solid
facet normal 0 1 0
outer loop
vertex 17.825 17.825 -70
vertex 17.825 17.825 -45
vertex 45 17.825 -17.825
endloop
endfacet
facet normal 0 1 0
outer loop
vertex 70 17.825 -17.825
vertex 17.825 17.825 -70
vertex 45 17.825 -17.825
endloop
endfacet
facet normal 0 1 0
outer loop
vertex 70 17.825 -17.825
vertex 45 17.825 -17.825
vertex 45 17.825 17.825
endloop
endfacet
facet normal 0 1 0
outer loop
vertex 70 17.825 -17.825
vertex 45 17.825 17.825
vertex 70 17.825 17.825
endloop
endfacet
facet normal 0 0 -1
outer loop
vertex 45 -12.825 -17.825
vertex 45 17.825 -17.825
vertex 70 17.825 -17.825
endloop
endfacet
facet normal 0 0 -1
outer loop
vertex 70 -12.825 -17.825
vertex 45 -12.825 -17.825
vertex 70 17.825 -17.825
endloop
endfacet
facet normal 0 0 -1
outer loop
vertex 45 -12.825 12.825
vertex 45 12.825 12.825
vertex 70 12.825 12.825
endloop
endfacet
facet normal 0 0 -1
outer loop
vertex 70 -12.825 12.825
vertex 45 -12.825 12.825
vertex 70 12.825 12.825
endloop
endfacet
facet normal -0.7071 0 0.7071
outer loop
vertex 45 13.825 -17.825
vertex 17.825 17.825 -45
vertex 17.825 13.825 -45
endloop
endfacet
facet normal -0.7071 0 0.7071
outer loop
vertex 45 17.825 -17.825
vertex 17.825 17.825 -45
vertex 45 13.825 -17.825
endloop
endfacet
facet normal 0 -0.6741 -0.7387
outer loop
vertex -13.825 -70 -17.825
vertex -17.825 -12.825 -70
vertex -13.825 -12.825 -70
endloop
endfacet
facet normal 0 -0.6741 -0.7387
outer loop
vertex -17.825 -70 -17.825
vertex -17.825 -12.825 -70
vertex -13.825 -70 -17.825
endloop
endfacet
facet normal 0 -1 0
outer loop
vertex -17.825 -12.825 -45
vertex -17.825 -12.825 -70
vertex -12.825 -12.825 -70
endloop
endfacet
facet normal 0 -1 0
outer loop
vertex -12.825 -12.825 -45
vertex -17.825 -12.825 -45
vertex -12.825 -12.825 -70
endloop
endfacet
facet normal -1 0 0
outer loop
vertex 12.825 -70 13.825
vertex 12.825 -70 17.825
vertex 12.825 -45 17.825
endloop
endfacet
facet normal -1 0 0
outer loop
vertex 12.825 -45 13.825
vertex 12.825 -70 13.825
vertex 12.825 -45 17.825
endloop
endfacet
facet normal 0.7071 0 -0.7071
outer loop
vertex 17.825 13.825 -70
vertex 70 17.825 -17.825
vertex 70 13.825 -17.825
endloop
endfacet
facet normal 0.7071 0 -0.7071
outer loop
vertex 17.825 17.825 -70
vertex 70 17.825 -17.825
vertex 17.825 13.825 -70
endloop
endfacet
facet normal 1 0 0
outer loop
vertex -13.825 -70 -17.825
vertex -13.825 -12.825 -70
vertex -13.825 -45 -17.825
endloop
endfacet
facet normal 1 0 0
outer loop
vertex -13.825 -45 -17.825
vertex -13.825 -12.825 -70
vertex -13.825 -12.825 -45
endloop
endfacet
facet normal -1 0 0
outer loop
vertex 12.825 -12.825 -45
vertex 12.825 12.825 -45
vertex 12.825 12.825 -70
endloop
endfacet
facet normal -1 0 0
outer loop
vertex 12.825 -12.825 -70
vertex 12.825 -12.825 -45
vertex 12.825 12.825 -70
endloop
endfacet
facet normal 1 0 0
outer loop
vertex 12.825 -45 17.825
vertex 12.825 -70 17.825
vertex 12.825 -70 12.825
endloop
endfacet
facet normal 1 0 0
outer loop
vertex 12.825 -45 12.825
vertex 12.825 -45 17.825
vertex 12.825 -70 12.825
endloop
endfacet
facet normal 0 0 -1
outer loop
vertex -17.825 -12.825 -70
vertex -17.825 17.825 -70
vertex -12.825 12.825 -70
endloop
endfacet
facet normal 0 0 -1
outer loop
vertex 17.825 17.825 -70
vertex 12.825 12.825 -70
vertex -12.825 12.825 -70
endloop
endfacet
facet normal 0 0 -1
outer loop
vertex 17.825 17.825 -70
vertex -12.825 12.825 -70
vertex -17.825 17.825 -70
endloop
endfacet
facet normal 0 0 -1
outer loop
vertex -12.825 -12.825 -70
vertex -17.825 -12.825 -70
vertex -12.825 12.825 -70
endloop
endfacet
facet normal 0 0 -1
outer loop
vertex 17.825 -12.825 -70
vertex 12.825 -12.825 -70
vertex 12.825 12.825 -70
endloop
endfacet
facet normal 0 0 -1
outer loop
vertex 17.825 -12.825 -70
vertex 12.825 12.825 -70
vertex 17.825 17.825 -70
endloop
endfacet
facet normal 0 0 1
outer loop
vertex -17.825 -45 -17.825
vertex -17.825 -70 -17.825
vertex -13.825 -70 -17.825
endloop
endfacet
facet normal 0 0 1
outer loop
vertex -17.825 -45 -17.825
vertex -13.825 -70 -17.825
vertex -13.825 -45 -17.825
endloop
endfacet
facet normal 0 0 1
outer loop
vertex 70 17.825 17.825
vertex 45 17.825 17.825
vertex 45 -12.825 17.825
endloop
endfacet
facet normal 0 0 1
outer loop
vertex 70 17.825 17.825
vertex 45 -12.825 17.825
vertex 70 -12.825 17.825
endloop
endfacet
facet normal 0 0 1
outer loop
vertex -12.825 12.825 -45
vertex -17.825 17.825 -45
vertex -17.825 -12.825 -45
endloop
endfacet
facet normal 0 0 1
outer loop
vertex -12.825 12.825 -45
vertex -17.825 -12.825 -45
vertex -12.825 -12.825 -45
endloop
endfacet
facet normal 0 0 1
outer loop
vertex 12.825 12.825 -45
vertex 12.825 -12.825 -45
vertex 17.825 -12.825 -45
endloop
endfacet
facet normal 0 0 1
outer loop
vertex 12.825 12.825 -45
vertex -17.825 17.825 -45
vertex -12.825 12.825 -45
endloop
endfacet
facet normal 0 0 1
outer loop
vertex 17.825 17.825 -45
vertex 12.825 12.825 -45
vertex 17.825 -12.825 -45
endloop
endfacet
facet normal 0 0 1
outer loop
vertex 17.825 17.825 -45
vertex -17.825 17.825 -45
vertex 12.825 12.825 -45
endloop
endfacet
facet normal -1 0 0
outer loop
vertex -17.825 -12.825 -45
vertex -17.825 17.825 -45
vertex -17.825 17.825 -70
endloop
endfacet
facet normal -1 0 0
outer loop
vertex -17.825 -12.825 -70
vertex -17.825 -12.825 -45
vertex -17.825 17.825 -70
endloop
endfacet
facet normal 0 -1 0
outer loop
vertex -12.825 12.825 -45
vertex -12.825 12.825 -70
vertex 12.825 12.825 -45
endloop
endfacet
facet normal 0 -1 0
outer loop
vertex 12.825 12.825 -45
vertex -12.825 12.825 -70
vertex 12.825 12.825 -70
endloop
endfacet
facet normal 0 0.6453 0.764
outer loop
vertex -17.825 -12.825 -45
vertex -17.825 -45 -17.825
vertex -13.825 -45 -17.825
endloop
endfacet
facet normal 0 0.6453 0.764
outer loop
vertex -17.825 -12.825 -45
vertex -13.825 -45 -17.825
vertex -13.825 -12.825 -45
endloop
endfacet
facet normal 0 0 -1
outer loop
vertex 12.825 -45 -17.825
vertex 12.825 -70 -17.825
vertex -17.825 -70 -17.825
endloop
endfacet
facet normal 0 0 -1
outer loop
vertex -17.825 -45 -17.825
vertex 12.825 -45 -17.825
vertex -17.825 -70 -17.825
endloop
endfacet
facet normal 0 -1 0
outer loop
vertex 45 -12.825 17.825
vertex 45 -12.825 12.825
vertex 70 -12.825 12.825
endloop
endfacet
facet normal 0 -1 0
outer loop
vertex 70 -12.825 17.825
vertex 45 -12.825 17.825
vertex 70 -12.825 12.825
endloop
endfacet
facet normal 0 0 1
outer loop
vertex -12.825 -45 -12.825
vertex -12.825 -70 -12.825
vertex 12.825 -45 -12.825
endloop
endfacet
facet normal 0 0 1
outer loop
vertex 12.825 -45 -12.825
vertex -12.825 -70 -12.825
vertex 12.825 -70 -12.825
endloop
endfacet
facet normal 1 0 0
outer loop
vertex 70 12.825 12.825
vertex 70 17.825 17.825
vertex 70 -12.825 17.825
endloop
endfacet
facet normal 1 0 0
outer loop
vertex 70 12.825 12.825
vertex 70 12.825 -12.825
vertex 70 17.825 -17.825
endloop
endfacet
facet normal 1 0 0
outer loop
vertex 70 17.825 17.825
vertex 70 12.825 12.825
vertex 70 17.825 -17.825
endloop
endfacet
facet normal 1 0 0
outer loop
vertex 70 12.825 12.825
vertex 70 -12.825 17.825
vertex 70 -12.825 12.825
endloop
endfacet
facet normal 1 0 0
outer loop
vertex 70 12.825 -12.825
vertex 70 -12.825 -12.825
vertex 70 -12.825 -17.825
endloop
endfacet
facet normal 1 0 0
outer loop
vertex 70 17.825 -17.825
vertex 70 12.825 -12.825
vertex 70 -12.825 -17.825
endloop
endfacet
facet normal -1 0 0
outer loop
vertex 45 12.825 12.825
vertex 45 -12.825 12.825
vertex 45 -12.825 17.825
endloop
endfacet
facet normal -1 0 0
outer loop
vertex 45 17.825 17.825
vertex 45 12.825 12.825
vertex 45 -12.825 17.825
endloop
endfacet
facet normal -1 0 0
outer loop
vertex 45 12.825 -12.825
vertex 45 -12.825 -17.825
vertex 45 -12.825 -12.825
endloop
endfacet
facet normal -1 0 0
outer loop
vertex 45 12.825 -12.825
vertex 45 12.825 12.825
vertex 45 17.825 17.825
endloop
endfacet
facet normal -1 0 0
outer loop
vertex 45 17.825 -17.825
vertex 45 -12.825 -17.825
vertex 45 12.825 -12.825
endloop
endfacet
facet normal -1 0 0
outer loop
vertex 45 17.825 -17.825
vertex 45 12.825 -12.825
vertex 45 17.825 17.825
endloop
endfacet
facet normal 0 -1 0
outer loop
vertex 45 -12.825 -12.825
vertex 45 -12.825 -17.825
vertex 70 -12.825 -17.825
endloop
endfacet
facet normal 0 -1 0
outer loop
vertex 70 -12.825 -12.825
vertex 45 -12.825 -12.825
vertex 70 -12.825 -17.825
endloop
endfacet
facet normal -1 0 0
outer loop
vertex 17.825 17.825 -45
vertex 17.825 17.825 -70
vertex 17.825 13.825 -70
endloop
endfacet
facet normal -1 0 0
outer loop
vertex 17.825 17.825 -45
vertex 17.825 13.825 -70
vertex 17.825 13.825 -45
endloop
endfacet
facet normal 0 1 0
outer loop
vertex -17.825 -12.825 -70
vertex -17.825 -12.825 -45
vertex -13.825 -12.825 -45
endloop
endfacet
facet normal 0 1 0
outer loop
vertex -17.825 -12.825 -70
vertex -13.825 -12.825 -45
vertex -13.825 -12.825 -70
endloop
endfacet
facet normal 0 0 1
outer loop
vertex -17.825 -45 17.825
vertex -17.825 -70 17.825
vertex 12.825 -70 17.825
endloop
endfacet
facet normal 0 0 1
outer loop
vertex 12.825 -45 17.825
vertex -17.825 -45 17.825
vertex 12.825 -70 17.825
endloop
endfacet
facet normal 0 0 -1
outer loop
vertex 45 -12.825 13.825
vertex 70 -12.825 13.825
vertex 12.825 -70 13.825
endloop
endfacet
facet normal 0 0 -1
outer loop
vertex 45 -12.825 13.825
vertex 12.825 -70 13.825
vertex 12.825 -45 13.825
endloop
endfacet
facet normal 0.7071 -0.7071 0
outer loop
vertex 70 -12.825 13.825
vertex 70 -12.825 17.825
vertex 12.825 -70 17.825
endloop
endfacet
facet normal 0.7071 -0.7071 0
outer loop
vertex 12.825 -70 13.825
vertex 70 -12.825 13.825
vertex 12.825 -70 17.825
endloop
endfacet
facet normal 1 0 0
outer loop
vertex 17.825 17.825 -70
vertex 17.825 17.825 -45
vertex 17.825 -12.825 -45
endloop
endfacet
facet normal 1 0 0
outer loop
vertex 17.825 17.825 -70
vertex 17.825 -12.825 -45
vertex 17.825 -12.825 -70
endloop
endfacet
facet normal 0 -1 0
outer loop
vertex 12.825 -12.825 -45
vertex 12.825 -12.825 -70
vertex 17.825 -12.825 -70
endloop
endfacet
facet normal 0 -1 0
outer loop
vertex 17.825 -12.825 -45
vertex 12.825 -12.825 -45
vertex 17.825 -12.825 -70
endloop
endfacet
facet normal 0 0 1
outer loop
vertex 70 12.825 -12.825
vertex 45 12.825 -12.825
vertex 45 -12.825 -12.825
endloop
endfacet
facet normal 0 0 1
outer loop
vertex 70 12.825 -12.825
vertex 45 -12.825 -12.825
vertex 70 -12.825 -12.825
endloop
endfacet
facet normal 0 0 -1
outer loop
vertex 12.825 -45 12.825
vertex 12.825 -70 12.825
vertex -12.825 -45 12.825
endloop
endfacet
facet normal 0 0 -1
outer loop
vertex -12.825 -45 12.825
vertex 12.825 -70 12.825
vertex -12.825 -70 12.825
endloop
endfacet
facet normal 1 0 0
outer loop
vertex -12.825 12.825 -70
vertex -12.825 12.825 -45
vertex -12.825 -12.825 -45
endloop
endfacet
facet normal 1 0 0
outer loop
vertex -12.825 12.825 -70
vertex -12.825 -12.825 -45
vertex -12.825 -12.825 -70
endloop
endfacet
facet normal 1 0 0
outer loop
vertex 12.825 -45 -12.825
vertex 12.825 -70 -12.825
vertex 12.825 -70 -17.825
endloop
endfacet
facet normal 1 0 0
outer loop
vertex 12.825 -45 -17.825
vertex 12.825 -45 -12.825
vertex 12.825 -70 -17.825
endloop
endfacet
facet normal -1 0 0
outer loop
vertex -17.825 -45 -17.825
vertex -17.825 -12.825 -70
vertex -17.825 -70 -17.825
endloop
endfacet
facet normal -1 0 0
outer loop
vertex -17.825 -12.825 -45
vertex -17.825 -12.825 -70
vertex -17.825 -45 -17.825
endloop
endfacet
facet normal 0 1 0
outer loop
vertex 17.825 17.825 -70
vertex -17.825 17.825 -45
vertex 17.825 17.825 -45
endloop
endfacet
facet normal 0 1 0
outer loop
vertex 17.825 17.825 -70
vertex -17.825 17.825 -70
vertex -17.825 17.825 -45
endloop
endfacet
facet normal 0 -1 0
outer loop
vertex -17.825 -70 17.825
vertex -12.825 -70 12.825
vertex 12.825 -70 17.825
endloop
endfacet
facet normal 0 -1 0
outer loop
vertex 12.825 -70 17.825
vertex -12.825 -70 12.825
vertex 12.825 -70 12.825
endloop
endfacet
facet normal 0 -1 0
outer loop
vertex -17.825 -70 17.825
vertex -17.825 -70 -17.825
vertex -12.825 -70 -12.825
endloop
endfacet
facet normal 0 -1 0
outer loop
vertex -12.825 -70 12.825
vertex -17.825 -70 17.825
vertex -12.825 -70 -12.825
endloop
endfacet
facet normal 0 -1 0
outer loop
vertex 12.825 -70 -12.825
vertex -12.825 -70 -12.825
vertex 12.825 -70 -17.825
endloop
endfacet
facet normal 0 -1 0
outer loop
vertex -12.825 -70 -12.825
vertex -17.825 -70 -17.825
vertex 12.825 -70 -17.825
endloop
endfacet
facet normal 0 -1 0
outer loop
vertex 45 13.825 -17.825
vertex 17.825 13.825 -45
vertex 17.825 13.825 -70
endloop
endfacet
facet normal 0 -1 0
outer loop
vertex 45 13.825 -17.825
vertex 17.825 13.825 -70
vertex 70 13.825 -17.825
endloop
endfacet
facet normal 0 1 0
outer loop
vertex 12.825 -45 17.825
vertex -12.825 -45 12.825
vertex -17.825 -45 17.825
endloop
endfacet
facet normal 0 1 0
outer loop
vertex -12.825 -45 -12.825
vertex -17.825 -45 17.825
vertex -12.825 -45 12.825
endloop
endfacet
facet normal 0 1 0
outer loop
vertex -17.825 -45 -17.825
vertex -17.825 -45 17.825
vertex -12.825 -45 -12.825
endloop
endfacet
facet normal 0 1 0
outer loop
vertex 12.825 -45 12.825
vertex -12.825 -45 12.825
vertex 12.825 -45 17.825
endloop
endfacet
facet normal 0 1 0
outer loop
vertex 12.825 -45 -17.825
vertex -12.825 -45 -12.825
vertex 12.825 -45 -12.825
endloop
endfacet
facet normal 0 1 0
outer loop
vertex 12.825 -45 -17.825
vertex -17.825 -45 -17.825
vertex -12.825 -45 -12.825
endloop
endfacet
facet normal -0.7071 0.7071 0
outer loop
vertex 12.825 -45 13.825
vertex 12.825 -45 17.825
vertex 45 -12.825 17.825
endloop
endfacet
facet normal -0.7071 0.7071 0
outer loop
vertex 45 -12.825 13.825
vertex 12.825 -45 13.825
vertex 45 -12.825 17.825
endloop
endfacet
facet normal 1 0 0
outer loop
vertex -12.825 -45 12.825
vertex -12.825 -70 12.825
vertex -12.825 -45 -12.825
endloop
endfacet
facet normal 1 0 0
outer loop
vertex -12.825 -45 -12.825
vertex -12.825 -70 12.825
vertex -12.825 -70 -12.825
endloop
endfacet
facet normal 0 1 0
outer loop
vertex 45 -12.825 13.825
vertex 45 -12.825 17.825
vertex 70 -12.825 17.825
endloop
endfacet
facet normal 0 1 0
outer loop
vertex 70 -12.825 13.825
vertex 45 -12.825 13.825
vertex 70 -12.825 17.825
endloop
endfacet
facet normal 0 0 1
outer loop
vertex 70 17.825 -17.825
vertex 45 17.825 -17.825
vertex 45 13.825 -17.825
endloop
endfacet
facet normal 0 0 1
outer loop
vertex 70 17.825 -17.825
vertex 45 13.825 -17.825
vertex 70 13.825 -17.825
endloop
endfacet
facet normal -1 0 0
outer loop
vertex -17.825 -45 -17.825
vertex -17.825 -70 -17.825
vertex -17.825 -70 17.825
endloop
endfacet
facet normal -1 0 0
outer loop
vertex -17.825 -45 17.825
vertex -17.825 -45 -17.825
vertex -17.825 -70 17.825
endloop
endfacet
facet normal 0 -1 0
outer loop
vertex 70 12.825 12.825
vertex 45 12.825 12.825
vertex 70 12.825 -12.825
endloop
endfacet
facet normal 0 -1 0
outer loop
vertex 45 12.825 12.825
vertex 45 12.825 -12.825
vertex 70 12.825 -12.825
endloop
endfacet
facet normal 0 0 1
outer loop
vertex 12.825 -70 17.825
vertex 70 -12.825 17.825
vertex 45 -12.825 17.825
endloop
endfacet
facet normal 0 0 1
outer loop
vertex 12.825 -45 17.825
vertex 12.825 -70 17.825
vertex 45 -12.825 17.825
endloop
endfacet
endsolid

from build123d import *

# Parameters (mm, degrees)
C_START                                 = -12.825
C_CHANNEL_IGVC_5MM_CORNER_3_OUTLINE_W   = 52.175
C_CHANNEL_IGVC_5MM_CORNER_3_OUTLINE_H   = 5
C_CHANNEL_IGVC_5MM_CORNER_3_OUTLINE_W_2 = 57.175
C_CHANNEL_IGVC_5MM_CORNER_3_DEPTH       = 30.65
C_START_2                               = 12.825
C_CHANNEL_IGVC_5MM_CORNER_3_2_DEPTH     = 5
C_START_3                               = -70
C_CHANNEL_IGVC_5MM_CORNER_3_3_DEPTH     = 57.175
C_CHANNEL_IGVC_5MM_CORNER_3_4_OUTLINE_W = 5
C_CHANNEL_IGVC_5MM_CORNER_3_4_OUTLINE_H = 70
C_CHANNEL_IGVC_5MM_CORNER_3_4_DEPTH     = 30.65
C_CHANNEL_IGVC_5MM_CORNER_3_5_OUTLINE_W = 25.65
C_CHANNEL_IGVC_5MM_CORNER_3_5_OUTLINE_H = 70
C_CHANNEL_IGVC_5MM_CORNER_3_5_DEPTH     = 5
CUT_EXTRUDE1_DEPTH                      = 30
CUT_EXTRUDE1_DEPTH_BACK                 = 45
SKETCH16_W                              = 90
SKETCH16_H                              = 90
BOSS_EXTRUDE1_DEPTH                     = 4
BOSS_EXTRUDE2_DEPTH                     = 4
BOSS_EXTRUDE3_DEPTH                     = 4


# Read off the part's stored shape, not the designer's step: C channel IGVC_5MM_CORNER(3)
with BuildPart() as part:
    # C channel IGVC_5MM_CORNER(3) outline → C channel IGVC_5MM_CORNER(3) (new body)
    with BuildSketch(Plane(origin=(0, 0, 0), x_dir=(1, 0, 0), z_dir=(0, 1, 0)).offset(C_START)):
        with Locations((43.9125, 15.325)):
            Rectangle(C_CHANNEL_IGVC_5MM_CORNER_3_OUTLINE_W, C_CHANNEL_IGVC_5MM_CORNER_3_OUTLINE_H)
        with Locations((41.4125, -15.325)):
            Rectangle(C_CHANNEL_IGVC_5MM_CORNER_3_OUTLINE_W_2, C_CHANNEL_IGVC_5MM_CORNER_3_OUTLINE_H)
    extrude(amount=C_CHANNEL_IGVC_5MM_CORNER_3_DEPTH)

    # C channel IGVC_5MM_CORNER_3 2 outline → C channel IGVC_5MM_CORNER_3 2 (add)
    with BuildSketch(Plane(origin=(0, 0, 0), x_dir=(1, 0, 0), z_dir=(0, 1, 0)).offset(C_START_2)):
        Polygon((70, -12.825), (70, 12.825), (17.825, 12.825), (17.825, 0), (-12.825, 0), (-12.825, -12.825), align=None)
    extrude(amount=C_CHANNEL_IGVC_5MM_CORNER_3_2_DEPTH)


with BuildPart() as body_2:
    # C channel IGVC_5MM_CORNER_3 3 outline → C channel IGVC_5MM_CORNER_3 3 (new body)
    with BuildSketch(Plane(origin=(0, 0, 0), x_dir=(1, 0, 0), z_dir=(0, 1, 0)).offset(C_START_3)):
        Polygon((-17.825, -17.825), (12.825, -17.825), (12.825, -12.825), (-12.825, -12.825), (-12.825, 12.825), (12.825, 12.825), (12.825, 17.825), (-17.825, 17.825), align=None)
    extrude(amount=C_CHANNEL_IGVC_5MM_CORNER_3_3_DEPTH)


with BuildPart() as body_3:
    # C channel IGVC_5MM_CORNER_3 4 outline → C channel IGVC_5MM_CORNER_3 4 (new body)
    with BuildSketch(Plane(origin=(0, 0, 0), x_dir=(1, 0, 0), z_dir=(0, 1, 0)).offset(C_START)):
        with Locations((-15.325, 35)):
            Rectangle(C_CHANNEL_IGVC_5MM_CORNER_3_4_OUTLINE_W, C_CHANNEL_IGVC_5MM_CORNER_3_4_OUTLINE_H)
        with Locations((15.325, 35)):
            Rectangle(C_CHANNEL_IGVC_5MM_CORNER_3_4_OUTLINE_W, C_CHANNEL_IGVC_5MM_CORNER_3_4_OUTLINE_H)
    extrude(amount=C_CHANNEL_IGVC_5MM_CORNER_3_4_DEPTH)

    # C channel IGVC_5MM_CORNER_3 5 outline → C channel IGVC_5MM_CORNER_3 5 (add)
    with BuildSketch(Plane(origin=(0, 0, 0), x_dir=(1, 0, 0), z_dir=(0, 1, 0)).offset(C_START_2)):
        with Locations((0, 35)):
            Rectangle(C_CHANNEL_IGVC_5MM_CORNER_3_5_OUTLINE_W, C_CHANNEL_IGVC_5MM_CORNER_3_5_OUTLINE_H)
    extrude(amount=C_CHANNEL_IGVC_5MM_CORNER_3_5_DEPTH)


with BuildPart() as cut_extrude1_tool:
    # Sketch16 → Cut-Extrude1 (new, two sides: drawn at the far end of the back side and taken through both)
    with BuildSketch(Plane.XY.offset(-CUT_EXTRUDE1_DEPTH_BACK)):
        Rectangle(SKETCH16_W, SKETCH16_H)
    extrude(amount=CUT_EXTRUDE1_DEPTH + CUT_EXTRUDE1_DEPTH_BACK)


with BuildPart() as part_1:
    add(part.part)

    # Cut-Extrude1: cut by cut_extrude1_tool
    add(cut_extrude1_tool.part, mode=Mode.SUBTRACT)


with BuildPart() as body_2_1:
    add(body_2.part)

    # Cut-Extrude1: cut by cut_extrude1_tool
    add(cut_extrude1_tool.part, mode=Mode.SUBTRACT)


with BuildPart() as body_3_1:
    add(body_3.part)

    # Cut-Extrude1: cut by cut_extrude1_tool
    add(cut_extrude1_tool.part, mode=Mode.SUBTRACT)


with BuildPart() as body_4:
    # Sketch22 → Boss-Extrude1 (new body)
    with BuildSketch(Plane(origin=(0, 17.825, 0), x_dir=(1, 0, 0), z_dir=(0, 1, 0))):
        Polygon((17.825, 45), (45, 17.825), (70, 17.825), (17.825, 70), align=None)
    extrude(amount=-BOSS_EXTRUDE1_DEPTH)


with BuildPart() as body_5:
    # Sketch21 → Boss-Extrude2 (new body)
    with BuildSketch(Plane.ZY.offset(17.825)):
        Polygon((-17.825, -45), (-45, -12.825), (-70, -12.825), (-17.825, -70), align=None)
    extrude(amount=-BOSS_EXTRUDE2_DEPTH)


with BuildPart() as body_6:
    # Sketch20 → Boss-Extrude3 (new body)
    with BuildSketch(Plane.XY.offset(17.825)):
        Polygon((12.825, -45), (45, -12.825), (70, -12.825), (12.825, -70), align=None)
    extrude(amount=-BOSS_EXTRUDE3_DEPTH)


solid = Compound([part_1.part, body_2_1.part, body_3_1.part, body_4.part, body_5.part, body_6.part])
